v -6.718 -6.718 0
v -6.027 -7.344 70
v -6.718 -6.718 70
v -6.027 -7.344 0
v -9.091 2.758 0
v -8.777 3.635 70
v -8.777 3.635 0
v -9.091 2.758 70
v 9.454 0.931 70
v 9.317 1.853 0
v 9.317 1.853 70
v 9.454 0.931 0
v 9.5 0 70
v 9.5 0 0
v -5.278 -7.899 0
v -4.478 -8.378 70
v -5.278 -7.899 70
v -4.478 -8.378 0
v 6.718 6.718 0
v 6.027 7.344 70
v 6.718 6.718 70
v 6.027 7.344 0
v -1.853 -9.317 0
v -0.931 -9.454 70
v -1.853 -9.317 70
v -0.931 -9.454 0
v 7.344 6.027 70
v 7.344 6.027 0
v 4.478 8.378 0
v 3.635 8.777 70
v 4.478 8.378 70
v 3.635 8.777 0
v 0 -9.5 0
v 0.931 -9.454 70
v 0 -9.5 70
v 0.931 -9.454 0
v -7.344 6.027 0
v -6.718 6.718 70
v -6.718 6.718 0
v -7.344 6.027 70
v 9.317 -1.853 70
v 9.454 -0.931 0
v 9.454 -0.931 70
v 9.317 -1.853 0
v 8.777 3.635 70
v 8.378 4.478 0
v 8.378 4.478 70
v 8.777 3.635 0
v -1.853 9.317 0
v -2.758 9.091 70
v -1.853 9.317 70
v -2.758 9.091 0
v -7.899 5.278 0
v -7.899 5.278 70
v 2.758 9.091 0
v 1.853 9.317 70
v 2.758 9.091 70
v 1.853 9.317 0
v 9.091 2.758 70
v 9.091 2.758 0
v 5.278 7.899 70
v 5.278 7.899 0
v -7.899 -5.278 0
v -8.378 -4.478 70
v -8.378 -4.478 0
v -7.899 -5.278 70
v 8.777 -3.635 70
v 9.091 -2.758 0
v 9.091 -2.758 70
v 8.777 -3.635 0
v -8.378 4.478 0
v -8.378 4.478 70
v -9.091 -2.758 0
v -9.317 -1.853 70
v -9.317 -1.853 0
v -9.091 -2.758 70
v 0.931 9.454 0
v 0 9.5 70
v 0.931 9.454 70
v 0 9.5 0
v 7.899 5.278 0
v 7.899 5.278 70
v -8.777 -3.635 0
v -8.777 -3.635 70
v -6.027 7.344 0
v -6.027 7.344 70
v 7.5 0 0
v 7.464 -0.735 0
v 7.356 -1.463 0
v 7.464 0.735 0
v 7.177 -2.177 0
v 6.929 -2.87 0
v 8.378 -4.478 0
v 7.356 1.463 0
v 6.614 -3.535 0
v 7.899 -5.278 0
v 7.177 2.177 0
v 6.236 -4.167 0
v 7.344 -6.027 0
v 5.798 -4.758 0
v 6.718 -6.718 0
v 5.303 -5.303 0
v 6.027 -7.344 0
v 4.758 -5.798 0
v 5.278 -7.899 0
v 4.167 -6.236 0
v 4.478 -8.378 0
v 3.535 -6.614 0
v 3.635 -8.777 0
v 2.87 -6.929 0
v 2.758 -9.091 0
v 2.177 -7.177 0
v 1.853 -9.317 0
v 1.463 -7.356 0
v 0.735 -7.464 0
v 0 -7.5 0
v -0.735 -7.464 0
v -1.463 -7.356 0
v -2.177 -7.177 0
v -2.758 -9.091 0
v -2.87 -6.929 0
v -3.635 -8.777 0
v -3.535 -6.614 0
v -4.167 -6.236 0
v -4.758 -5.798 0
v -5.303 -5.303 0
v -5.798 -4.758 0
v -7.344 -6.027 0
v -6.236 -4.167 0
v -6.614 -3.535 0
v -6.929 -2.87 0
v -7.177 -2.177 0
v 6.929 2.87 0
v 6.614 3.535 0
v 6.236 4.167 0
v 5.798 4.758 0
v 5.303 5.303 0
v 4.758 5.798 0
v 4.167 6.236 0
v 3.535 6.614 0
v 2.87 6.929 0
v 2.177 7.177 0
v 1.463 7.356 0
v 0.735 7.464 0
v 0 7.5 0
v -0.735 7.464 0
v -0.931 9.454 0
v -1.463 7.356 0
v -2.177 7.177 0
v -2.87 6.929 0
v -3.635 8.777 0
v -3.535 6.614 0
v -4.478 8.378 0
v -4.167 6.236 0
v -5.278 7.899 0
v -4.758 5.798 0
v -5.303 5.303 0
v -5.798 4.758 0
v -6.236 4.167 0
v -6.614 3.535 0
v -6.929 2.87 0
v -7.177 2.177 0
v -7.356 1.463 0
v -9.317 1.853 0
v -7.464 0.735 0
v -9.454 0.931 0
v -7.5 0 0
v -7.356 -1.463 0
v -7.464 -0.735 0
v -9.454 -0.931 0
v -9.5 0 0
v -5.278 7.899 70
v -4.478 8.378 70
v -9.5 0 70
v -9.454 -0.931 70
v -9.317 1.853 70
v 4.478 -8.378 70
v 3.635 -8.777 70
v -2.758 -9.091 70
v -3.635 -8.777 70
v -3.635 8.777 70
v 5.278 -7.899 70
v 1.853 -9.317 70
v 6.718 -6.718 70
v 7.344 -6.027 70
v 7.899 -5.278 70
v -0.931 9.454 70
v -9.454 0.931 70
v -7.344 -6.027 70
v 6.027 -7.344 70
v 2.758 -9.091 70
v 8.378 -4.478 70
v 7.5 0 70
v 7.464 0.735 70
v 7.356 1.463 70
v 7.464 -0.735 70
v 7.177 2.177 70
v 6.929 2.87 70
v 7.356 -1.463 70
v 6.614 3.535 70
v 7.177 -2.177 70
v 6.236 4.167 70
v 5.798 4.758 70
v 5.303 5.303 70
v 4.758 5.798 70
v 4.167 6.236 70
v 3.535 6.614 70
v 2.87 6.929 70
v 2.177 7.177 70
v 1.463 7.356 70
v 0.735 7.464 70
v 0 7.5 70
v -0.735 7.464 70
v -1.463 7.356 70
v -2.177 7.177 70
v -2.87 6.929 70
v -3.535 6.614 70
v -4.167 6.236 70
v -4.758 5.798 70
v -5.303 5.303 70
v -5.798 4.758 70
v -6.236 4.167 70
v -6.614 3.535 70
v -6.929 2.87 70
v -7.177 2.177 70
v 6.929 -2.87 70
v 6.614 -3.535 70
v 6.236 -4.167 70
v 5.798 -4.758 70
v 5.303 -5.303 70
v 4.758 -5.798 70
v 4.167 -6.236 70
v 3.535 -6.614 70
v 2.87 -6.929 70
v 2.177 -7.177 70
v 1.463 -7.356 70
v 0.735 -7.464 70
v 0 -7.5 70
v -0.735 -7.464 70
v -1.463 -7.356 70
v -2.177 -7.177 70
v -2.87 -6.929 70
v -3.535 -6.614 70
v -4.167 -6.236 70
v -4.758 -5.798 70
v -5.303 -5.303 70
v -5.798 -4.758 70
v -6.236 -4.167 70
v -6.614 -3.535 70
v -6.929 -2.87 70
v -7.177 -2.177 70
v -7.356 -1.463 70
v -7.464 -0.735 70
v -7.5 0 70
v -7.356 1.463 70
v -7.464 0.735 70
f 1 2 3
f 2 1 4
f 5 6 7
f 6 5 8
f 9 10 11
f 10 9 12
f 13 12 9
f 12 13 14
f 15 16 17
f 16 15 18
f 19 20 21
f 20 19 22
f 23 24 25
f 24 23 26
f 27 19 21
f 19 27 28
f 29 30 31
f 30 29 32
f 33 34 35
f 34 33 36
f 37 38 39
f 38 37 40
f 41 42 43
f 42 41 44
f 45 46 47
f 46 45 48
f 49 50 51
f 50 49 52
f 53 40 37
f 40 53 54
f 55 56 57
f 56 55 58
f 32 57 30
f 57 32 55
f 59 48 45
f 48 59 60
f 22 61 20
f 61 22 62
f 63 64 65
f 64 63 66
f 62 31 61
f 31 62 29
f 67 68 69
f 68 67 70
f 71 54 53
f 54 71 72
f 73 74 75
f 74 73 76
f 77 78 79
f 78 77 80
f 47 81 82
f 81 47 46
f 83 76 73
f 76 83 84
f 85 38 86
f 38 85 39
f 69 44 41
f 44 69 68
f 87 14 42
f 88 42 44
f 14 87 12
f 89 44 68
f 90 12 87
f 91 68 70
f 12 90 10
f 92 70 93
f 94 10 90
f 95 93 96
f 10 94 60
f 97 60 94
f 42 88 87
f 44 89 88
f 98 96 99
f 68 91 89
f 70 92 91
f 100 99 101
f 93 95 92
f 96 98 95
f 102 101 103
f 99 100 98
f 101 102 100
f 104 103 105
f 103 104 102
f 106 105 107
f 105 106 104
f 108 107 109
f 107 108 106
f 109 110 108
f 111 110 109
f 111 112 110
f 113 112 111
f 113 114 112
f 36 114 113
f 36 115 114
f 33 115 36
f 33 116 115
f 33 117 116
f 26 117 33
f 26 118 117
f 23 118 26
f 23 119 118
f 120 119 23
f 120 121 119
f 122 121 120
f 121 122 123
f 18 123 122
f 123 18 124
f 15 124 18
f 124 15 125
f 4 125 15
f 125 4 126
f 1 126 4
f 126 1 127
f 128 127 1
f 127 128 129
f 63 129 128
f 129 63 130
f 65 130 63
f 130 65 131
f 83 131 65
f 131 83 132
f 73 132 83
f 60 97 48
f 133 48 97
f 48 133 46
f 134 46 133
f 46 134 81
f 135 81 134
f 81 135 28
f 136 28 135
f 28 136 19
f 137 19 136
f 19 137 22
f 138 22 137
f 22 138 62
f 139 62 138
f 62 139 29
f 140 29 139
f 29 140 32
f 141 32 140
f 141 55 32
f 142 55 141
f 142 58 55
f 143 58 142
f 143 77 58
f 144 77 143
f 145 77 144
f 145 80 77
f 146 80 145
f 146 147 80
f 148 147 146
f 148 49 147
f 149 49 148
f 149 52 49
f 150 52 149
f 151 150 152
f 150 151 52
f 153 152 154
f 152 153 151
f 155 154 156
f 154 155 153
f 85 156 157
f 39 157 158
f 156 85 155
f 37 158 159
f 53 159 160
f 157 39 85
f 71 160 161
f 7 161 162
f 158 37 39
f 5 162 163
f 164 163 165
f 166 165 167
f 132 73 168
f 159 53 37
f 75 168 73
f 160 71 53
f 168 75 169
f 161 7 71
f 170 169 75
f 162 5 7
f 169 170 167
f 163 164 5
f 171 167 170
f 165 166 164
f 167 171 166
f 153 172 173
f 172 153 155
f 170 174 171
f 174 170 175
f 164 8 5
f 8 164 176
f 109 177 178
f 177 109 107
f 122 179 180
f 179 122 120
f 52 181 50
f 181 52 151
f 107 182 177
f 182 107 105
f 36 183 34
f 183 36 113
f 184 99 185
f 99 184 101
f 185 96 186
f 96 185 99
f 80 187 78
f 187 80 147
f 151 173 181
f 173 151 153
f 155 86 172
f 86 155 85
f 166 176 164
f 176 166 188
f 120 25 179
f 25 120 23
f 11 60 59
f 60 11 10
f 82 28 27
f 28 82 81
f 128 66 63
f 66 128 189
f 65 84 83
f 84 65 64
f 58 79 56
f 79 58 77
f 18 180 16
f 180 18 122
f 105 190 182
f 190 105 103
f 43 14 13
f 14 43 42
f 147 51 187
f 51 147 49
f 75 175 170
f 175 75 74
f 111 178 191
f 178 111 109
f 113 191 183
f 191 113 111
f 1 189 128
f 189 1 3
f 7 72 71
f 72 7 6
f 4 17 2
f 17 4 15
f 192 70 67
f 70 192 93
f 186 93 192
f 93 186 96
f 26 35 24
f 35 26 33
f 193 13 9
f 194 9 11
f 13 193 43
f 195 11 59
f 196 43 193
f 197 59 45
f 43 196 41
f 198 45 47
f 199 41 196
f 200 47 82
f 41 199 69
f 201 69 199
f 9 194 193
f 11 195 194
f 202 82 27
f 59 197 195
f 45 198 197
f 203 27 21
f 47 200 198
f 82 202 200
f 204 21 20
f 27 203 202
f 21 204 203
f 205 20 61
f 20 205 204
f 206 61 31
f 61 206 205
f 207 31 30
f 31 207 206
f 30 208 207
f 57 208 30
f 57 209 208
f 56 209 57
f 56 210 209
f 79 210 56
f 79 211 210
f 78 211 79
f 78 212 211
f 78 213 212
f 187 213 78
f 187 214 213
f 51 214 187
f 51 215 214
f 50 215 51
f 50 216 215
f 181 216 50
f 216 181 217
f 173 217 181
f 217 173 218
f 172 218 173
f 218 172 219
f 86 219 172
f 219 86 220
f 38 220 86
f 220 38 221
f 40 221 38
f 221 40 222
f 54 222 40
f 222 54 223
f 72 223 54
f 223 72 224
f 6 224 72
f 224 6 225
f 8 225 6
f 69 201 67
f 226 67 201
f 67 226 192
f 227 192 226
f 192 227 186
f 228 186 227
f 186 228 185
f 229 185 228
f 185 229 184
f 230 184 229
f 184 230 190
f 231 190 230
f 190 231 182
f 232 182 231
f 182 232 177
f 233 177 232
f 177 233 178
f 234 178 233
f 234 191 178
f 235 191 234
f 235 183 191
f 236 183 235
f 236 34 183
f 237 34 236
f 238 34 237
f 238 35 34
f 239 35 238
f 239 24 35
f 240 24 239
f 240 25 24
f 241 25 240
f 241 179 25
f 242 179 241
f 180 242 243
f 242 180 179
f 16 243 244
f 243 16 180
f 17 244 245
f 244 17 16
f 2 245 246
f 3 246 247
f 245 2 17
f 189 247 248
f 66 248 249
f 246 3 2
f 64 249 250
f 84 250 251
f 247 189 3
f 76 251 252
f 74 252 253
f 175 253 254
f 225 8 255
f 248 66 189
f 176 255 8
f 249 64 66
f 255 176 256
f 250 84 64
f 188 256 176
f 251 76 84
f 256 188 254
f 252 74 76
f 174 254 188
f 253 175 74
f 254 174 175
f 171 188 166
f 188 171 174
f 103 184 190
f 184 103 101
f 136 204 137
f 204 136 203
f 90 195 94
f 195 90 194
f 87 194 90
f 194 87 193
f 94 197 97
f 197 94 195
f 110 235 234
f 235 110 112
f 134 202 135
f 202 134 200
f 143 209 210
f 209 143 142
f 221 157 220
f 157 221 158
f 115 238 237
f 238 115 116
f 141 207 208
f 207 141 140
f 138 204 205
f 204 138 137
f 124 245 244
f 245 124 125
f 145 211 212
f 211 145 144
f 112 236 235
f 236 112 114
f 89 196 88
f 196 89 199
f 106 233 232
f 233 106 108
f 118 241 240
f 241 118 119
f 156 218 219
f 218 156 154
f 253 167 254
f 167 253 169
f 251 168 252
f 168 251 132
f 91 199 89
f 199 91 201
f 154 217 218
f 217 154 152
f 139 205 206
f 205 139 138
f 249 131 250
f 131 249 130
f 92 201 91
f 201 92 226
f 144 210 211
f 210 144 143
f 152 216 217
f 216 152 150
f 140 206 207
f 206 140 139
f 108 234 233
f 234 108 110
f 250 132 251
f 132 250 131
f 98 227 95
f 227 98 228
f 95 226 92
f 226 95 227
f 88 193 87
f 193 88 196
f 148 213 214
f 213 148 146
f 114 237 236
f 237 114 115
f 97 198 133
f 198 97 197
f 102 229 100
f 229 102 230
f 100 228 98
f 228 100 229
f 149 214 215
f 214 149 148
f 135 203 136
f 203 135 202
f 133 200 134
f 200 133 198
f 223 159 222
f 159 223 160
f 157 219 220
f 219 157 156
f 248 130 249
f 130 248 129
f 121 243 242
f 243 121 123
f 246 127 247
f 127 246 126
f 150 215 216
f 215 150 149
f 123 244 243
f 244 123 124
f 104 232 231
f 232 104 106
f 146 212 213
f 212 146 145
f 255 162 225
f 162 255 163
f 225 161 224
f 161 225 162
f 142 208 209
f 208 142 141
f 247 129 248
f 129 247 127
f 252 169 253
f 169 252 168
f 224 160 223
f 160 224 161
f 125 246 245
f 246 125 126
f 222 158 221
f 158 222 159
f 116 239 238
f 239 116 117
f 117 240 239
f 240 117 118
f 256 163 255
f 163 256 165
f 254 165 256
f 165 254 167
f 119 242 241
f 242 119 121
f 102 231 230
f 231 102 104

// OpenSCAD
//A simple tube designed to connect the head of the massager to the
//Handle.

//Designed to be printed in TPU or another flexible material

thickness = 2;
length =  70;
id = 15;
$fn = 64;

difference(){

    cylinder(h = length, d = id + 2 * thickness);
    cylinder(h = length, d = id);

}
